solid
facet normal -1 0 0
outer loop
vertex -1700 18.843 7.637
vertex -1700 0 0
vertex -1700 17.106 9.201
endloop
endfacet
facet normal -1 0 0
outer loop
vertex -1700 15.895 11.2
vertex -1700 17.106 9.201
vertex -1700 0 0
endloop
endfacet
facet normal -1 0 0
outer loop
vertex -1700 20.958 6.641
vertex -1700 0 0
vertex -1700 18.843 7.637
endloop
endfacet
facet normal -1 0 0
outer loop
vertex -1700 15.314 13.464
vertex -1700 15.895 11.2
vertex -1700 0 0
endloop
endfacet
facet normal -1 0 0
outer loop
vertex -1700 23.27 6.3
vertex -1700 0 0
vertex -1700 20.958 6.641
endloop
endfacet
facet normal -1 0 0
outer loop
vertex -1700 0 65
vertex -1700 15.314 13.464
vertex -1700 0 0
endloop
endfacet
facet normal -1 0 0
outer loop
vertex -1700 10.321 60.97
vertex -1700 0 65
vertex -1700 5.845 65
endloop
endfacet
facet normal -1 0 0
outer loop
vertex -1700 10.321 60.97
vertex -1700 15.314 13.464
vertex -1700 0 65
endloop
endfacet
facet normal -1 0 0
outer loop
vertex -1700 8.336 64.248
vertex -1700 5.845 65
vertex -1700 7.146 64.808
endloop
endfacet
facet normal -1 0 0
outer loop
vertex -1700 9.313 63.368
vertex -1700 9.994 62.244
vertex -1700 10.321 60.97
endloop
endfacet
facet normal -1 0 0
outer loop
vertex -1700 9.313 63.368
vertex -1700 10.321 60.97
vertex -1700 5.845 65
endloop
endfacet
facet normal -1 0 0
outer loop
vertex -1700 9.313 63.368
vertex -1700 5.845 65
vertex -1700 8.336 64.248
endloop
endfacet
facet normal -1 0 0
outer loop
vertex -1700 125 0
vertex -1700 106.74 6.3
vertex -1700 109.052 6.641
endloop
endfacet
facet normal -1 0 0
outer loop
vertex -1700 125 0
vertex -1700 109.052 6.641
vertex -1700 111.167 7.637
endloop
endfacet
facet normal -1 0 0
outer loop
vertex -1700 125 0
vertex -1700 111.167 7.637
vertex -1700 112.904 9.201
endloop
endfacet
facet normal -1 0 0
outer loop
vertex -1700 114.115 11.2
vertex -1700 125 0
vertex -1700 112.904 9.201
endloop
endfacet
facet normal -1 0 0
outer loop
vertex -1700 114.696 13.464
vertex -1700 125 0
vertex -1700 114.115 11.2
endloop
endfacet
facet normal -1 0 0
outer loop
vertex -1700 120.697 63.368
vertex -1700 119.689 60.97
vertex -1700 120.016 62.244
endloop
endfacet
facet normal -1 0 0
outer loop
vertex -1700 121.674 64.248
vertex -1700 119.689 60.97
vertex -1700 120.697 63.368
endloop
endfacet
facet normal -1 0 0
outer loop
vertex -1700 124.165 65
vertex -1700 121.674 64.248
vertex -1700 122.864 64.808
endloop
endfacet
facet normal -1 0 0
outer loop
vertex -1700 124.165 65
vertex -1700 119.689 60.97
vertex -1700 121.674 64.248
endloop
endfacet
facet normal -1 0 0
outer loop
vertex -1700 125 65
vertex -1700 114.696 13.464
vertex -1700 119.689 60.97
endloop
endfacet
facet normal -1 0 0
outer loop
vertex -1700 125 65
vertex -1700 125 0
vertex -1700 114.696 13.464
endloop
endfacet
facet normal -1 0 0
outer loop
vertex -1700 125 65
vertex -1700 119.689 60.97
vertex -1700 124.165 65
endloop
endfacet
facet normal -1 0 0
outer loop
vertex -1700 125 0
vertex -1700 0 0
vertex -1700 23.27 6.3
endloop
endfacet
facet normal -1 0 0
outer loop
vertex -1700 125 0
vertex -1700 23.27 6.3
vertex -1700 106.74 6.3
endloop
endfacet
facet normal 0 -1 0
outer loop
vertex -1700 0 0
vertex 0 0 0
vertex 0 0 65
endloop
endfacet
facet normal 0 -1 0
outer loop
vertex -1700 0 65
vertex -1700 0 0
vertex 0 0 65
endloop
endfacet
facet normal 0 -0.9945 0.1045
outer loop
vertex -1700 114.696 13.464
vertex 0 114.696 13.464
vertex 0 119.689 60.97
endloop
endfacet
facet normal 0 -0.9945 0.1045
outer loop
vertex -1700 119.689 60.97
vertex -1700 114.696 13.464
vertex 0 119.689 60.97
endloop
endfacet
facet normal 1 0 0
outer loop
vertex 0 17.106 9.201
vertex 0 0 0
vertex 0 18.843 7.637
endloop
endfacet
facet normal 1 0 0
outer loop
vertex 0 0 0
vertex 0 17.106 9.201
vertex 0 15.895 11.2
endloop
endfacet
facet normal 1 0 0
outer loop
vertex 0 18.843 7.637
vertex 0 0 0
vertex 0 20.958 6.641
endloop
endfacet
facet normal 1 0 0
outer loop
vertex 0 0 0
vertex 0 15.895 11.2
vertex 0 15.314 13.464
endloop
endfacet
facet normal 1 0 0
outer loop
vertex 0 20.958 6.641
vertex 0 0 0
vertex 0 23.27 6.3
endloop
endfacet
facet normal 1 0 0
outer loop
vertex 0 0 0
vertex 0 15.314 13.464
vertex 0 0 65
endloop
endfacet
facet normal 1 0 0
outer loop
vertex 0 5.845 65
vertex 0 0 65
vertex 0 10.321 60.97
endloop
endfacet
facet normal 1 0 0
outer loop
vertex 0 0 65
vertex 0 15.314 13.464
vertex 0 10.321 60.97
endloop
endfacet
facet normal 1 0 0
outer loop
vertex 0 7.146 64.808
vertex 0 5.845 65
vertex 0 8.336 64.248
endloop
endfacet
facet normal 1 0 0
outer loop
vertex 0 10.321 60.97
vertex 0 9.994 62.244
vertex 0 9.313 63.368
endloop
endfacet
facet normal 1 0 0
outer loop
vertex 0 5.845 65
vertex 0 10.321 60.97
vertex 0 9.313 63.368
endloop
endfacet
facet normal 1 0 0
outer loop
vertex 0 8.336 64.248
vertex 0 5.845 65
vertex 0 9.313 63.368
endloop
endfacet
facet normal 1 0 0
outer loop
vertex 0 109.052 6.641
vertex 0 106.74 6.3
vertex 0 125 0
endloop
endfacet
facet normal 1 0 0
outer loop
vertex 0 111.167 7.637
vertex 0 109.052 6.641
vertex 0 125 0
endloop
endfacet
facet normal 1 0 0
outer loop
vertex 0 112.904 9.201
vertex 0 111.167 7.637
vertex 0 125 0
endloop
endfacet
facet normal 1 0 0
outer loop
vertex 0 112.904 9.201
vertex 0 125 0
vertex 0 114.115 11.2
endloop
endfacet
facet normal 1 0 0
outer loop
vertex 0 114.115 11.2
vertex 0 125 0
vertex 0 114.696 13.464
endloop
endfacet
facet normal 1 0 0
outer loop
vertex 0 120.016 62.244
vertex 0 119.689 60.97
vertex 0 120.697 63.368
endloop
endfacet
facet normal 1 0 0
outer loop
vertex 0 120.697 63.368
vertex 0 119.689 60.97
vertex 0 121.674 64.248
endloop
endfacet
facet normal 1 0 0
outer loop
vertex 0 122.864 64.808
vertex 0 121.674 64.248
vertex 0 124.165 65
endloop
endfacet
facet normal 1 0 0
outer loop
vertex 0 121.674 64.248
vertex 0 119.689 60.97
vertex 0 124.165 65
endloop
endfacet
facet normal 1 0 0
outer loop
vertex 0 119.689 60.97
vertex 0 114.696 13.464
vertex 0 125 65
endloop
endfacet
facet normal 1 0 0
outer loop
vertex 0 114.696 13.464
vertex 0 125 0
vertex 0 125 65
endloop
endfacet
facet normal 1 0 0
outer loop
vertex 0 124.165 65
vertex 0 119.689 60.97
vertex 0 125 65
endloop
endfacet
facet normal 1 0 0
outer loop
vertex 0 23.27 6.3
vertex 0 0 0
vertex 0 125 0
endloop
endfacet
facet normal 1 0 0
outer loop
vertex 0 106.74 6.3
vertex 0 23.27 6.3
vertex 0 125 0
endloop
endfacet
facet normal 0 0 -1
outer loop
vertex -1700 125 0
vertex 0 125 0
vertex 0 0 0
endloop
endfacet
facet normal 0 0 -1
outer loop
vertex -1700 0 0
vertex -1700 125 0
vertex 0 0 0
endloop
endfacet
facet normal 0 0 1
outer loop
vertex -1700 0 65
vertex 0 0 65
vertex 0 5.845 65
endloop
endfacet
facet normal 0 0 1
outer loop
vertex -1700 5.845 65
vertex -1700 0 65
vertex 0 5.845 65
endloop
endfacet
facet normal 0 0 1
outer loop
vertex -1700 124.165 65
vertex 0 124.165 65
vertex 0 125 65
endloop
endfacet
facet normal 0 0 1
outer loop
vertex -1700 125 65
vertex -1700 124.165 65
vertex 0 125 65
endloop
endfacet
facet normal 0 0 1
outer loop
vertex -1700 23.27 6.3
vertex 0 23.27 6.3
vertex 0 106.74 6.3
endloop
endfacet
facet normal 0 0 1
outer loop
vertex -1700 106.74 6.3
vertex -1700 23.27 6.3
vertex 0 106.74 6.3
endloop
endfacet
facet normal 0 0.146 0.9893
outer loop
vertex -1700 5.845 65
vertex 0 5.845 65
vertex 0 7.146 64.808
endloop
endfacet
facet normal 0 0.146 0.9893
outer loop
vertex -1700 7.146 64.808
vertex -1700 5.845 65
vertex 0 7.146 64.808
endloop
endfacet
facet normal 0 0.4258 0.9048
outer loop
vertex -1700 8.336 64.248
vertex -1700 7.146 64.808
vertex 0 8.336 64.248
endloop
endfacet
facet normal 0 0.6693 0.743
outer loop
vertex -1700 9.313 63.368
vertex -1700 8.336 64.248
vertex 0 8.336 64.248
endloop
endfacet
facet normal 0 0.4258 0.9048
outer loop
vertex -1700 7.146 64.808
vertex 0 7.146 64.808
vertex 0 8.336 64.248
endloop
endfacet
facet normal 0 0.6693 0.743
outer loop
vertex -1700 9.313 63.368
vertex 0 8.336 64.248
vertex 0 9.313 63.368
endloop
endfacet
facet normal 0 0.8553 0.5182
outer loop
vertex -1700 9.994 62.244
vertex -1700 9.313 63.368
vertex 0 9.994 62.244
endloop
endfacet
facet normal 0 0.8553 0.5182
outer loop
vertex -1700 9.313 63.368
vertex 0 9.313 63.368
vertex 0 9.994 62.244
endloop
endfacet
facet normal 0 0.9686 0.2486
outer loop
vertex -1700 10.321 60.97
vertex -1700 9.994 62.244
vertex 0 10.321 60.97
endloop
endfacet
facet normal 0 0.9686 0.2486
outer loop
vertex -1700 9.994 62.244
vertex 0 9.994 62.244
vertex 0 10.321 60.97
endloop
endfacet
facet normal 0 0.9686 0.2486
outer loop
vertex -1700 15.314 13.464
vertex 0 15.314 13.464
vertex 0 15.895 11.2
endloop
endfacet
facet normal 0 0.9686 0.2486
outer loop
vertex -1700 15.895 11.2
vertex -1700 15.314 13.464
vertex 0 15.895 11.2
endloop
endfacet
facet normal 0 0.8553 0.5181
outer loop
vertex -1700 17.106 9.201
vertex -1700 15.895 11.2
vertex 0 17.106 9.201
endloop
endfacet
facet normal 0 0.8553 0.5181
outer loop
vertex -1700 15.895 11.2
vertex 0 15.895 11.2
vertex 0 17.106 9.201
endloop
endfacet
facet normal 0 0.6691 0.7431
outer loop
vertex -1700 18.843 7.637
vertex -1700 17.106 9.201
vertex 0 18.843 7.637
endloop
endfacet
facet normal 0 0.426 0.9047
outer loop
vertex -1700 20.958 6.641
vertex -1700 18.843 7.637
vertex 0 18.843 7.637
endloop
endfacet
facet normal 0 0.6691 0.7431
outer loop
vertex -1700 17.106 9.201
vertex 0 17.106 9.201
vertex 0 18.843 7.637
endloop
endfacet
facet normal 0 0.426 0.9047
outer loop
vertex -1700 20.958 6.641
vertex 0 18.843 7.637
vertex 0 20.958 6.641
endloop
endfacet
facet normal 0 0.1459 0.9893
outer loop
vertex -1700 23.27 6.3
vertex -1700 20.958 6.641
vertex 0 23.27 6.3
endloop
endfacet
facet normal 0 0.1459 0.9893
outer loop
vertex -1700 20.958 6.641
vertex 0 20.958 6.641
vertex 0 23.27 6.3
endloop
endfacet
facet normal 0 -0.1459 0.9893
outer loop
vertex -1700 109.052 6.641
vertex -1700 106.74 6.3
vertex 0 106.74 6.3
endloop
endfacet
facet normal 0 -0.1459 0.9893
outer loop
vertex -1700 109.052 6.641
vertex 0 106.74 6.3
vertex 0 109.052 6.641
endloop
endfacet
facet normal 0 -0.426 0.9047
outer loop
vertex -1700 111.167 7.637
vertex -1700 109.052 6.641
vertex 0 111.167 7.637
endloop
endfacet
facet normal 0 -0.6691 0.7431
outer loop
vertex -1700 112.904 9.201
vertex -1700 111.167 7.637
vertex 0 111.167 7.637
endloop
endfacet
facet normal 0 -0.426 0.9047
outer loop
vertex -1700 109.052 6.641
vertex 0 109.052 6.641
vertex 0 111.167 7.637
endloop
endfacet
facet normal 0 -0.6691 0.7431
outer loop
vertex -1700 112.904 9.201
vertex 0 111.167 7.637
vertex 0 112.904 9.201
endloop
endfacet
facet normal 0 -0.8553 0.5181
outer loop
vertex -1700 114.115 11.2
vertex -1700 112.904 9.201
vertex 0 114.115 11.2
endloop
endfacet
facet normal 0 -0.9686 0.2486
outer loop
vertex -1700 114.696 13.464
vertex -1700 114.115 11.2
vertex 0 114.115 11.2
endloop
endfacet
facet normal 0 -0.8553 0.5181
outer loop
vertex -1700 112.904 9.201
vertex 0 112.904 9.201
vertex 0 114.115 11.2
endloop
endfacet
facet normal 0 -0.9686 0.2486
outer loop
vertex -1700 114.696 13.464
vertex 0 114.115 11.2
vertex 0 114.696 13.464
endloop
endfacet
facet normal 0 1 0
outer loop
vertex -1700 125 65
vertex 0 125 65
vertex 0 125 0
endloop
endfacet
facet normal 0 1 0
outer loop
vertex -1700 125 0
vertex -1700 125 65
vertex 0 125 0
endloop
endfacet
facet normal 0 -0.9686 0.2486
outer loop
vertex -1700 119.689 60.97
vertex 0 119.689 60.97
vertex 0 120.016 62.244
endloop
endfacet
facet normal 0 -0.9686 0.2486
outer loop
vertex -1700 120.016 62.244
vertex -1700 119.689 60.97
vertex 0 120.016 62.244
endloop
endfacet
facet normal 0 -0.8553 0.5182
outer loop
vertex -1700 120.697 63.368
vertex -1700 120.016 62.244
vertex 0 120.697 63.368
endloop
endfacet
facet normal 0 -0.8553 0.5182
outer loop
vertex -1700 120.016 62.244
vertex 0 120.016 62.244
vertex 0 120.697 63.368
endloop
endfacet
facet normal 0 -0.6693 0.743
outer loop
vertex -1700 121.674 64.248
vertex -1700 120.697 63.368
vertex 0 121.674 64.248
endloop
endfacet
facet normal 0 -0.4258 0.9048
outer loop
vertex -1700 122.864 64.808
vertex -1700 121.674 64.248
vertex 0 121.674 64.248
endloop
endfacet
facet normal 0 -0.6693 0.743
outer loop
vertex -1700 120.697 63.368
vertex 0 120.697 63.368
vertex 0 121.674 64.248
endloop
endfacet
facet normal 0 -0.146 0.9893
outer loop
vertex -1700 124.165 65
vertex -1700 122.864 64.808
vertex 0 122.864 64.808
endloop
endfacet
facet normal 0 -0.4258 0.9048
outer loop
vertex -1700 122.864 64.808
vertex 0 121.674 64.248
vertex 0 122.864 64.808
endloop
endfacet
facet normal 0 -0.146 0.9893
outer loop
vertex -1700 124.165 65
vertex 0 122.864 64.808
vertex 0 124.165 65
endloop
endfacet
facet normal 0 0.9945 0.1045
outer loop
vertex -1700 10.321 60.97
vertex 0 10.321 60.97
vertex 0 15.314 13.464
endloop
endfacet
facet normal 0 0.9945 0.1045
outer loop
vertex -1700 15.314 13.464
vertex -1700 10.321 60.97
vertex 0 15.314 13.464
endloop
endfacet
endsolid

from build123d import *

# Parameters (mm, degrees)
C_CHANNEL_120_X_12_1_DEPTH = 1700


with BuildPart() as part:
    # Sketch12 → C channel 120 X 12(1) (new body)
    with BuildSketch(Plane.ZY):
        with BuildLine():
            Line((65, 125), (0, 125))
            Line((0, 125), (0, 0))
            Line((0, 0), (65, 0))
            Line((65, 0), (65, 5.845330836))
            ThreePointArc((65, 5.845330836), (63.844151715, 8.856418565), (60.970378085, 10.320679365))
            Line((60.970378085, 10.320679365), (13.463772294, 15.313824837))
            ThreePointArc((13.463772294, 15.313824837), (8.354841396, 17.916955149), (6.3, 23.27))
            Line((6.3, 23.27), (6.3, 106.74))
            ThreePointArc((6.3, 106.74), (8.354841396, 112.093044851), (13.463772294, 114.696175163))
            Line((13.463772294, 114.696175163), (60.970378085, 119.689320635))
            ThreePointArc((60.970378085, 119.689320635), (63.844151715, 121.153581435), (65, 124.164669164))
            Line((65, 124.164669164), (65, 125))
        make_face()
    extrude(amount=C_CHANNEL_120_X_12_1_DEPTH)


solid = part.part
